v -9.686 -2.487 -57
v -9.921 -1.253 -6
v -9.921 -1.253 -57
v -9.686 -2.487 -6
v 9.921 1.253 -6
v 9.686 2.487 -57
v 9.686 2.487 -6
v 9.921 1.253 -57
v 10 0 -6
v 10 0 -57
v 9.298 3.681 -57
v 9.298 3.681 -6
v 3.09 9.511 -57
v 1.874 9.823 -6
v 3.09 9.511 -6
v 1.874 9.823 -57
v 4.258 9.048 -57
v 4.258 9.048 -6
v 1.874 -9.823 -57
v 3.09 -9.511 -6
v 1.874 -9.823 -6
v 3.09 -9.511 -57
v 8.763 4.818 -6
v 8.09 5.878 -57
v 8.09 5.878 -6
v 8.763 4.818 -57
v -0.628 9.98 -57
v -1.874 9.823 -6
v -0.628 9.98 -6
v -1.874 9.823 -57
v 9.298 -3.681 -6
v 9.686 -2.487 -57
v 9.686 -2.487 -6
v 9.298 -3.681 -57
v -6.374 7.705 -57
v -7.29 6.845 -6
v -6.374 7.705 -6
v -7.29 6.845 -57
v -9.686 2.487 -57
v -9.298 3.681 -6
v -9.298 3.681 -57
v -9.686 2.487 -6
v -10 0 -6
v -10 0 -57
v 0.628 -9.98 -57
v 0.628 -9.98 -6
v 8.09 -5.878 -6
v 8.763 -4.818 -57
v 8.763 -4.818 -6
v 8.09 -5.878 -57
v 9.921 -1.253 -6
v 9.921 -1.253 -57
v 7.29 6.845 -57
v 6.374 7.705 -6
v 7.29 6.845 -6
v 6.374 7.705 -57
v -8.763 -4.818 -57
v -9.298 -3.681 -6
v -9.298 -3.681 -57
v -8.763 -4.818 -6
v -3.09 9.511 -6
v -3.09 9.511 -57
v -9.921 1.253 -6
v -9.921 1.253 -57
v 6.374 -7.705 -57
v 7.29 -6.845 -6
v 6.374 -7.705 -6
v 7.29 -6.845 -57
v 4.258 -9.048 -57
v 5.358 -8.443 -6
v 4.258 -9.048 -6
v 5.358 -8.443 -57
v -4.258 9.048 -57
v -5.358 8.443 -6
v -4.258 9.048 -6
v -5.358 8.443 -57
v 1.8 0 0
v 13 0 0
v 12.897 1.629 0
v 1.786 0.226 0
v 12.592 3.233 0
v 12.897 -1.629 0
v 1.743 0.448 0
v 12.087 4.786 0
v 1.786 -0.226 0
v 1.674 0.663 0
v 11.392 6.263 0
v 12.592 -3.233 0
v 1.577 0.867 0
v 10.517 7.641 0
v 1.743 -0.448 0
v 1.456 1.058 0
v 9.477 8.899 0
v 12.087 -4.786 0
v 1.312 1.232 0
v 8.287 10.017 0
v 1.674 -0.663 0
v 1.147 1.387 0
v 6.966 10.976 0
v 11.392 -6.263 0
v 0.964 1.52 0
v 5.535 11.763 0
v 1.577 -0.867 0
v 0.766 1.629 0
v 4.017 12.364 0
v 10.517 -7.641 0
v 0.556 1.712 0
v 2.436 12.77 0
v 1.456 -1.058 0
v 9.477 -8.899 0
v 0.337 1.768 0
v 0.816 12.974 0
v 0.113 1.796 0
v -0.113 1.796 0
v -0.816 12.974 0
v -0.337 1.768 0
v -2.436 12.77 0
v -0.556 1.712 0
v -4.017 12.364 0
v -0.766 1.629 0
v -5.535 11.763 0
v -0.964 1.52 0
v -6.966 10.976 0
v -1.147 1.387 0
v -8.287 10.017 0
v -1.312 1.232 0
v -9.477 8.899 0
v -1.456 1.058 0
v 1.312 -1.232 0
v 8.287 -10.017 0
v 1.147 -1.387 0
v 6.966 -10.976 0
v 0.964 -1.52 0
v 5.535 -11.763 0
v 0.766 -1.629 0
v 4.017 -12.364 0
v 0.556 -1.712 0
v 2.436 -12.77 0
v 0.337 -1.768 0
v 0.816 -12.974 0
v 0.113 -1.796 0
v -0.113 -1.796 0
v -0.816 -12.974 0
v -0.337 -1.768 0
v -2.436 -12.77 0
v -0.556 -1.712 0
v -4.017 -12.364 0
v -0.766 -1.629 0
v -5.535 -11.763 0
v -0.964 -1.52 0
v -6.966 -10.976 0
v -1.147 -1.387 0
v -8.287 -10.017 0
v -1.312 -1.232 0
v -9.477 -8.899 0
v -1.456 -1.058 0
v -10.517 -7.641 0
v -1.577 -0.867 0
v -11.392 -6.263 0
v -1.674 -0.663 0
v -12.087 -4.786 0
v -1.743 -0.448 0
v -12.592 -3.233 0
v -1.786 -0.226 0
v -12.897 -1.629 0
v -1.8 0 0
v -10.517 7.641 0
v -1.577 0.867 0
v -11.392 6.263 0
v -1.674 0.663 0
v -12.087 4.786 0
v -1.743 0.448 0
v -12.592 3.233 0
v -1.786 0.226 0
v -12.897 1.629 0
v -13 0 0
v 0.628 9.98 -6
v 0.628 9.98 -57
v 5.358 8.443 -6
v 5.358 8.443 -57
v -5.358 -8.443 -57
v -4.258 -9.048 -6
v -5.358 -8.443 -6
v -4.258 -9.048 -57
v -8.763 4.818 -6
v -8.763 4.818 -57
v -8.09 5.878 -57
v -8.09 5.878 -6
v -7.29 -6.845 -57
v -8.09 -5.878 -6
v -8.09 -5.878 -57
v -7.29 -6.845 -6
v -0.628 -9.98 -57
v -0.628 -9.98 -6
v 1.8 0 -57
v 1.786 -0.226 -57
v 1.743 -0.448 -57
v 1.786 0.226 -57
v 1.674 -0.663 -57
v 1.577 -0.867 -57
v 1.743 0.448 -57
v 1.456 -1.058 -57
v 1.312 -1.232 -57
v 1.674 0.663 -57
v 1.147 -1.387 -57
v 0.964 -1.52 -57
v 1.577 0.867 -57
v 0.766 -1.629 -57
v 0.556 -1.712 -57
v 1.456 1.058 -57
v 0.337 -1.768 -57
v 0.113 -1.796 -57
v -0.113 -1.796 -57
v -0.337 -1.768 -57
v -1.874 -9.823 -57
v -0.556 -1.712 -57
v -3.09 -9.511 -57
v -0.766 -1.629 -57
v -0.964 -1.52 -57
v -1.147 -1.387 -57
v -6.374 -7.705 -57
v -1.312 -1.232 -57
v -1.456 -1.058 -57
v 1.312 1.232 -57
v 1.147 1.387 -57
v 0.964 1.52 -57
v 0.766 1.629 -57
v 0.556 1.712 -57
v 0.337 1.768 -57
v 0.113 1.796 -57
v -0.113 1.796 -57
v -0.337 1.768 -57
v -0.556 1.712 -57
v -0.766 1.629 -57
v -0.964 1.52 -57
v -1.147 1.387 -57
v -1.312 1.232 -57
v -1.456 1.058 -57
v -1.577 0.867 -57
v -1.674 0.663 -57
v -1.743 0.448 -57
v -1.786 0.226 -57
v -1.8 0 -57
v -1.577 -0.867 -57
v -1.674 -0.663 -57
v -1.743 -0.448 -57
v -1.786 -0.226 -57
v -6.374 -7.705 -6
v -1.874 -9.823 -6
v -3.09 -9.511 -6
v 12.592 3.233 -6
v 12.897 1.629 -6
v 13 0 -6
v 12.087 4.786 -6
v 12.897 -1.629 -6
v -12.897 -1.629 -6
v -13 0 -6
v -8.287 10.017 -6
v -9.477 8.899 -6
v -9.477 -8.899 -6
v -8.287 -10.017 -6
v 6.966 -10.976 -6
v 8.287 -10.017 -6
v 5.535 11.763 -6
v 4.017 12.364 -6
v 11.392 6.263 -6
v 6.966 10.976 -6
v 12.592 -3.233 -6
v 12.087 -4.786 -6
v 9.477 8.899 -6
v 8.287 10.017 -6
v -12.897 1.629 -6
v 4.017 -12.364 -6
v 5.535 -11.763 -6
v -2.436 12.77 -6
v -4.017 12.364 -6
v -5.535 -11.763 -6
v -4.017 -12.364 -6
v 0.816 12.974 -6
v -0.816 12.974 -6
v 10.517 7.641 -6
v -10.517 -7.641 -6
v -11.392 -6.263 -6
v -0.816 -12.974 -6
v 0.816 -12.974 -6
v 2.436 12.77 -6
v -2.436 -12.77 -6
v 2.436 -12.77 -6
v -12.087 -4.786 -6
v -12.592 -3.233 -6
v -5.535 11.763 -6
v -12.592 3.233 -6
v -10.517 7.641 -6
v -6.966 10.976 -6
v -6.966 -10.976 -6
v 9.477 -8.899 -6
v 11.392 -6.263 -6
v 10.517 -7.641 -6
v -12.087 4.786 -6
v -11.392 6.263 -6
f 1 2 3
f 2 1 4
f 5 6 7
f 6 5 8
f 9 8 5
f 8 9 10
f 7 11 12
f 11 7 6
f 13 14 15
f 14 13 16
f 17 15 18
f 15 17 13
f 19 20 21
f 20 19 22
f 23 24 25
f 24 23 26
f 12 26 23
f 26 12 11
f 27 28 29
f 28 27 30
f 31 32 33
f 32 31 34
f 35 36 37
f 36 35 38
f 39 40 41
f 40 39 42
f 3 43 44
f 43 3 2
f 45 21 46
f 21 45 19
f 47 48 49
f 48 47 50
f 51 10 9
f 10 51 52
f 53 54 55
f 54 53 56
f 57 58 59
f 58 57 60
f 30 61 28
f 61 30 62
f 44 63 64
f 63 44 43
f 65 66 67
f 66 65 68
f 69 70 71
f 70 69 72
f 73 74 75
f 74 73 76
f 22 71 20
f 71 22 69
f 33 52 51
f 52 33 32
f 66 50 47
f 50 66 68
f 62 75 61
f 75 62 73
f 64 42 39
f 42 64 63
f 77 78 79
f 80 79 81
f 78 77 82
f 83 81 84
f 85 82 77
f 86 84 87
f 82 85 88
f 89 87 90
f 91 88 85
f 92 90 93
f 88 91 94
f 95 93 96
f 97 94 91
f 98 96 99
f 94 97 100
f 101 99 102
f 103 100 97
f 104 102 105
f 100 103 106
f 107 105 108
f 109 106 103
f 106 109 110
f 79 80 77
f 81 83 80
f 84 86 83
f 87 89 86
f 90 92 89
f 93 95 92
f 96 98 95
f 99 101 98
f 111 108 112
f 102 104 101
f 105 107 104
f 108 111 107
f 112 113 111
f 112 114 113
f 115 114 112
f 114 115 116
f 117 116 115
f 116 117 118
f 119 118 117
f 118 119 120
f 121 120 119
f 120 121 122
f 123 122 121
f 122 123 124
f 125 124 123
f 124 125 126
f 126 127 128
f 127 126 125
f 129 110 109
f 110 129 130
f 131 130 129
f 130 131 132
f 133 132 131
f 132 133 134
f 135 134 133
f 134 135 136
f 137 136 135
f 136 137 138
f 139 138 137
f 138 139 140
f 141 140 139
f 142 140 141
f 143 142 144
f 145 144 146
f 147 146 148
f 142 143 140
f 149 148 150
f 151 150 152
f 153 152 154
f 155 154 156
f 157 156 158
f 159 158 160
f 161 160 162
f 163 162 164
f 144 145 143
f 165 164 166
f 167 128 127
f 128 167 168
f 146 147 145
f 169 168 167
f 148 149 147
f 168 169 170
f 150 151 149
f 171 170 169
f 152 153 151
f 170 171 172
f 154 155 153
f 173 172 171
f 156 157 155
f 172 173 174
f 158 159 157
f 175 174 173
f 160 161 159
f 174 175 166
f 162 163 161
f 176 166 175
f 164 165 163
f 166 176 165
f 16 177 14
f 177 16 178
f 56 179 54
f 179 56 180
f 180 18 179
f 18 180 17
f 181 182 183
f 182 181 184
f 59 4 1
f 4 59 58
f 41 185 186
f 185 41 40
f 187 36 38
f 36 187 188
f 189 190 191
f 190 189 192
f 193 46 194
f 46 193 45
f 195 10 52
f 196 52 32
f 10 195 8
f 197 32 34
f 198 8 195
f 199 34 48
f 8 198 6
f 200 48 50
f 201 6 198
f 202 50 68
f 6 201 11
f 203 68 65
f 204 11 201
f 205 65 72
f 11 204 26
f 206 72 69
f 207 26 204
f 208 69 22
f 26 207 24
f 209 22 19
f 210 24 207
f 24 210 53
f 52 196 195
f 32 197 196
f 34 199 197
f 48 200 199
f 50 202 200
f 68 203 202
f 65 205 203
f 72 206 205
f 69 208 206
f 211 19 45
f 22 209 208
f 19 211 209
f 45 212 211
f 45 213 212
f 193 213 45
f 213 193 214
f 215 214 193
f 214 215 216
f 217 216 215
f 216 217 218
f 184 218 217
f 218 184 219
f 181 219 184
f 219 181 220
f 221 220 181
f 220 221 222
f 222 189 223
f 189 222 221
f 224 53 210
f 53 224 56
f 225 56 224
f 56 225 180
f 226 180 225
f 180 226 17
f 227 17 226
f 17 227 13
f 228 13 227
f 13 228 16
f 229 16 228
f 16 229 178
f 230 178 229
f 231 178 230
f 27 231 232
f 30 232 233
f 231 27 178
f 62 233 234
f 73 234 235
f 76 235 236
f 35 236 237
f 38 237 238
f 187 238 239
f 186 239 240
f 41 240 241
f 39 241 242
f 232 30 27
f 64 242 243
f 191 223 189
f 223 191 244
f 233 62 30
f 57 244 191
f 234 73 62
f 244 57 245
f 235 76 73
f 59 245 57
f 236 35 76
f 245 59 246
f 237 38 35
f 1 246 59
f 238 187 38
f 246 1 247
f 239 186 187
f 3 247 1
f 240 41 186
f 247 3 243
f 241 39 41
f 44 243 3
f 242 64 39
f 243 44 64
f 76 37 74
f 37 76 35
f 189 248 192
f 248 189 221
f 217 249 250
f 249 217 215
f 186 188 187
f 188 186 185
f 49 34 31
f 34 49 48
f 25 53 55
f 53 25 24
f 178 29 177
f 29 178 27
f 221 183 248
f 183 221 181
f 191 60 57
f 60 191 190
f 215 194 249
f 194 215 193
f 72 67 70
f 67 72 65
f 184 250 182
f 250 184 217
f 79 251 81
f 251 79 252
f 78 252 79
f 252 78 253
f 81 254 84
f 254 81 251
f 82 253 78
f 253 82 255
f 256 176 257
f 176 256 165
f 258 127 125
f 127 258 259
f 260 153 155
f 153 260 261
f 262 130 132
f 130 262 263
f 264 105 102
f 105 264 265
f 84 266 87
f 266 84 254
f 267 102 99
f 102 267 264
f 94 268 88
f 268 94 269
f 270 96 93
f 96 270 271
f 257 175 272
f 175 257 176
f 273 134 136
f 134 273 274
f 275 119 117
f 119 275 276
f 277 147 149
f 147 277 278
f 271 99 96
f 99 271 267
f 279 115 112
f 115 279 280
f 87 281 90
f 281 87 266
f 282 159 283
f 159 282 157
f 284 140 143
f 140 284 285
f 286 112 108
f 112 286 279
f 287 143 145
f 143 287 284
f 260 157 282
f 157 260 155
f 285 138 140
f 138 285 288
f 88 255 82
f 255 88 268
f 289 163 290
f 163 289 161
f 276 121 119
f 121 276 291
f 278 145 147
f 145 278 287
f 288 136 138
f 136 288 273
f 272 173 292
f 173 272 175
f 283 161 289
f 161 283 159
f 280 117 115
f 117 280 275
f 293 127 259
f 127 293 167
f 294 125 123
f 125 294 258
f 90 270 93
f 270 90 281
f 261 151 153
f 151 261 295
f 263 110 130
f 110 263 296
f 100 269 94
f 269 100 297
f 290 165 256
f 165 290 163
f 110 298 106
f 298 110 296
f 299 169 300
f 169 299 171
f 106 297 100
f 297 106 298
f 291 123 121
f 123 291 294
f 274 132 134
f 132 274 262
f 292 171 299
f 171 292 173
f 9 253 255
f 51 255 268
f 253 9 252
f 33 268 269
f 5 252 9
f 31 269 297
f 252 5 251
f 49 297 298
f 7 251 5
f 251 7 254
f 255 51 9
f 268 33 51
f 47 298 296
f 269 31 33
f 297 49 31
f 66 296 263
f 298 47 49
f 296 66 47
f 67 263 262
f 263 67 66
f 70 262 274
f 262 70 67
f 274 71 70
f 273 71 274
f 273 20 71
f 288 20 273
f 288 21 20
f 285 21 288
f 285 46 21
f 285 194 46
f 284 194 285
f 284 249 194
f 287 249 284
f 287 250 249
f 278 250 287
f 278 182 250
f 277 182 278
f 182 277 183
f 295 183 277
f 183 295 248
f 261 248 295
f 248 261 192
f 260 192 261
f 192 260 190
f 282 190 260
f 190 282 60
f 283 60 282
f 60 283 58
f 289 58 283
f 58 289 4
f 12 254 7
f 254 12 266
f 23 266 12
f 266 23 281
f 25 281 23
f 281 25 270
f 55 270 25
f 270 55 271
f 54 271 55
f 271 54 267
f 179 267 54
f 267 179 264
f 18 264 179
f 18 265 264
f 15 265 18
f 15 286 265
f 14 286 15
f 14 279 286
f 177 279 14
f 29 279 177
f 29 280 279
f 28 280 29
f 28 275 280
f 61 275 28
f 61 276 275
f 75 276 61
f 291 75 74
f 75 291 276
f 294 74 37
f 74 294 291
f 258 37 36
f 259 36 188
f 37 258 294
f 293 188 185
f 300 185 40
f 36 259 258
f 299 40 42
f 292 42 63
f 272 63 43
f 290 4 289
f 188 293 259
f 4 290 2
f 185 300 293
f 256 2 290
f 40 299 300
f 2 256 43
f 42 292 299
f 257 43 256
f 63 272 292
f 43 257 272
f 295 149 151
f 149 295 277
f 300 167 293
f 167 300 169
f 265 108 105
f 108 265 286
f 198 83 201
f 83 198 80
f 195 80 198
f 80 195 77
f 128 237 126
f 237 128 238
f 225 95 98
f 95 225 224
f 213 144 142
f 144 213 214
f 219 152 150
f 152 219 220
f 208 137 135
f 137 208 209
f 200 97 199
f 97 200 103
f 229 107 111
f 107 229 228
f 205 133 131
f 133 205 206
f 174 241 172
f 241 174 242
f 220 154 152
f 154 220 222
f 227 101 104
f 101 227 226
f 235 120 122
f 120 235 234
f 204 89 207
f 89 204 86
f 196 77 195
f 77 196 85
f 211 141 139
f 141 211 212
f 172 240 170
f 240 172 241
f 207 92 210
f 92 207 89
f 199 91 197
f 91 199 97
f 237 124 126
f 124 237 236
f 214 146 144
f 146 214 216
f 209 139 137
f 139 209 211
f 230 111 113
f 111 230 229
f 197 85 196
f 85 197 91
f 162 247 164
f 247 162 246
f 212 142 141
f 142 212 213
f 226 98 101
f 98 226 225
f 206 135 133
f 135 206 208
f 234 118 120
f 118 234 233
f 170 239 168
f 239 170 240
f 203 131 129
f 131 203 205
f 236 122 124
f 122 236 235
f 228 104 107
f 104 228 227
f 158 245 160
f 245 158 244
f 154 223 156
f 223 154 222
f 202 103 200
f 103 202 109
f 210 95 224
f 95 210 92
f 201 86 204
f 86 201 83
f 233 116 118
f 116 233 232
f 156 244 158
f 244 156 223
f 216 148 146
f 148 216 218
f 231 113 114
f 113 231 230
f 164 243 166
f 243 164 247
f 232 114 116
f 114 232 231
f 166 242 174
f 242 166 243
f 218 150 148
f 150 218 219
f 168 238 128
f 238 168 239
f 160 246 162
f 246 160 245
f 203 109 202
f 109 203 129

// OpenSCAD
$fn = 50;


difference() {
	union() {
		translate(v = [0, 0, -57.0000000000]) {
			cylinder(h = 57, r = 10.0000000000);
		}
		translate(v = [0, 0, -6.0000000000]) {
			cylinder(h = 6, r = 13.0000000000);
		}
	}
	union() {
		#translate(v = [0, 0, -57]) {
			cylinder(h = 57, r = 1.8000000000);
		}
	}
}
